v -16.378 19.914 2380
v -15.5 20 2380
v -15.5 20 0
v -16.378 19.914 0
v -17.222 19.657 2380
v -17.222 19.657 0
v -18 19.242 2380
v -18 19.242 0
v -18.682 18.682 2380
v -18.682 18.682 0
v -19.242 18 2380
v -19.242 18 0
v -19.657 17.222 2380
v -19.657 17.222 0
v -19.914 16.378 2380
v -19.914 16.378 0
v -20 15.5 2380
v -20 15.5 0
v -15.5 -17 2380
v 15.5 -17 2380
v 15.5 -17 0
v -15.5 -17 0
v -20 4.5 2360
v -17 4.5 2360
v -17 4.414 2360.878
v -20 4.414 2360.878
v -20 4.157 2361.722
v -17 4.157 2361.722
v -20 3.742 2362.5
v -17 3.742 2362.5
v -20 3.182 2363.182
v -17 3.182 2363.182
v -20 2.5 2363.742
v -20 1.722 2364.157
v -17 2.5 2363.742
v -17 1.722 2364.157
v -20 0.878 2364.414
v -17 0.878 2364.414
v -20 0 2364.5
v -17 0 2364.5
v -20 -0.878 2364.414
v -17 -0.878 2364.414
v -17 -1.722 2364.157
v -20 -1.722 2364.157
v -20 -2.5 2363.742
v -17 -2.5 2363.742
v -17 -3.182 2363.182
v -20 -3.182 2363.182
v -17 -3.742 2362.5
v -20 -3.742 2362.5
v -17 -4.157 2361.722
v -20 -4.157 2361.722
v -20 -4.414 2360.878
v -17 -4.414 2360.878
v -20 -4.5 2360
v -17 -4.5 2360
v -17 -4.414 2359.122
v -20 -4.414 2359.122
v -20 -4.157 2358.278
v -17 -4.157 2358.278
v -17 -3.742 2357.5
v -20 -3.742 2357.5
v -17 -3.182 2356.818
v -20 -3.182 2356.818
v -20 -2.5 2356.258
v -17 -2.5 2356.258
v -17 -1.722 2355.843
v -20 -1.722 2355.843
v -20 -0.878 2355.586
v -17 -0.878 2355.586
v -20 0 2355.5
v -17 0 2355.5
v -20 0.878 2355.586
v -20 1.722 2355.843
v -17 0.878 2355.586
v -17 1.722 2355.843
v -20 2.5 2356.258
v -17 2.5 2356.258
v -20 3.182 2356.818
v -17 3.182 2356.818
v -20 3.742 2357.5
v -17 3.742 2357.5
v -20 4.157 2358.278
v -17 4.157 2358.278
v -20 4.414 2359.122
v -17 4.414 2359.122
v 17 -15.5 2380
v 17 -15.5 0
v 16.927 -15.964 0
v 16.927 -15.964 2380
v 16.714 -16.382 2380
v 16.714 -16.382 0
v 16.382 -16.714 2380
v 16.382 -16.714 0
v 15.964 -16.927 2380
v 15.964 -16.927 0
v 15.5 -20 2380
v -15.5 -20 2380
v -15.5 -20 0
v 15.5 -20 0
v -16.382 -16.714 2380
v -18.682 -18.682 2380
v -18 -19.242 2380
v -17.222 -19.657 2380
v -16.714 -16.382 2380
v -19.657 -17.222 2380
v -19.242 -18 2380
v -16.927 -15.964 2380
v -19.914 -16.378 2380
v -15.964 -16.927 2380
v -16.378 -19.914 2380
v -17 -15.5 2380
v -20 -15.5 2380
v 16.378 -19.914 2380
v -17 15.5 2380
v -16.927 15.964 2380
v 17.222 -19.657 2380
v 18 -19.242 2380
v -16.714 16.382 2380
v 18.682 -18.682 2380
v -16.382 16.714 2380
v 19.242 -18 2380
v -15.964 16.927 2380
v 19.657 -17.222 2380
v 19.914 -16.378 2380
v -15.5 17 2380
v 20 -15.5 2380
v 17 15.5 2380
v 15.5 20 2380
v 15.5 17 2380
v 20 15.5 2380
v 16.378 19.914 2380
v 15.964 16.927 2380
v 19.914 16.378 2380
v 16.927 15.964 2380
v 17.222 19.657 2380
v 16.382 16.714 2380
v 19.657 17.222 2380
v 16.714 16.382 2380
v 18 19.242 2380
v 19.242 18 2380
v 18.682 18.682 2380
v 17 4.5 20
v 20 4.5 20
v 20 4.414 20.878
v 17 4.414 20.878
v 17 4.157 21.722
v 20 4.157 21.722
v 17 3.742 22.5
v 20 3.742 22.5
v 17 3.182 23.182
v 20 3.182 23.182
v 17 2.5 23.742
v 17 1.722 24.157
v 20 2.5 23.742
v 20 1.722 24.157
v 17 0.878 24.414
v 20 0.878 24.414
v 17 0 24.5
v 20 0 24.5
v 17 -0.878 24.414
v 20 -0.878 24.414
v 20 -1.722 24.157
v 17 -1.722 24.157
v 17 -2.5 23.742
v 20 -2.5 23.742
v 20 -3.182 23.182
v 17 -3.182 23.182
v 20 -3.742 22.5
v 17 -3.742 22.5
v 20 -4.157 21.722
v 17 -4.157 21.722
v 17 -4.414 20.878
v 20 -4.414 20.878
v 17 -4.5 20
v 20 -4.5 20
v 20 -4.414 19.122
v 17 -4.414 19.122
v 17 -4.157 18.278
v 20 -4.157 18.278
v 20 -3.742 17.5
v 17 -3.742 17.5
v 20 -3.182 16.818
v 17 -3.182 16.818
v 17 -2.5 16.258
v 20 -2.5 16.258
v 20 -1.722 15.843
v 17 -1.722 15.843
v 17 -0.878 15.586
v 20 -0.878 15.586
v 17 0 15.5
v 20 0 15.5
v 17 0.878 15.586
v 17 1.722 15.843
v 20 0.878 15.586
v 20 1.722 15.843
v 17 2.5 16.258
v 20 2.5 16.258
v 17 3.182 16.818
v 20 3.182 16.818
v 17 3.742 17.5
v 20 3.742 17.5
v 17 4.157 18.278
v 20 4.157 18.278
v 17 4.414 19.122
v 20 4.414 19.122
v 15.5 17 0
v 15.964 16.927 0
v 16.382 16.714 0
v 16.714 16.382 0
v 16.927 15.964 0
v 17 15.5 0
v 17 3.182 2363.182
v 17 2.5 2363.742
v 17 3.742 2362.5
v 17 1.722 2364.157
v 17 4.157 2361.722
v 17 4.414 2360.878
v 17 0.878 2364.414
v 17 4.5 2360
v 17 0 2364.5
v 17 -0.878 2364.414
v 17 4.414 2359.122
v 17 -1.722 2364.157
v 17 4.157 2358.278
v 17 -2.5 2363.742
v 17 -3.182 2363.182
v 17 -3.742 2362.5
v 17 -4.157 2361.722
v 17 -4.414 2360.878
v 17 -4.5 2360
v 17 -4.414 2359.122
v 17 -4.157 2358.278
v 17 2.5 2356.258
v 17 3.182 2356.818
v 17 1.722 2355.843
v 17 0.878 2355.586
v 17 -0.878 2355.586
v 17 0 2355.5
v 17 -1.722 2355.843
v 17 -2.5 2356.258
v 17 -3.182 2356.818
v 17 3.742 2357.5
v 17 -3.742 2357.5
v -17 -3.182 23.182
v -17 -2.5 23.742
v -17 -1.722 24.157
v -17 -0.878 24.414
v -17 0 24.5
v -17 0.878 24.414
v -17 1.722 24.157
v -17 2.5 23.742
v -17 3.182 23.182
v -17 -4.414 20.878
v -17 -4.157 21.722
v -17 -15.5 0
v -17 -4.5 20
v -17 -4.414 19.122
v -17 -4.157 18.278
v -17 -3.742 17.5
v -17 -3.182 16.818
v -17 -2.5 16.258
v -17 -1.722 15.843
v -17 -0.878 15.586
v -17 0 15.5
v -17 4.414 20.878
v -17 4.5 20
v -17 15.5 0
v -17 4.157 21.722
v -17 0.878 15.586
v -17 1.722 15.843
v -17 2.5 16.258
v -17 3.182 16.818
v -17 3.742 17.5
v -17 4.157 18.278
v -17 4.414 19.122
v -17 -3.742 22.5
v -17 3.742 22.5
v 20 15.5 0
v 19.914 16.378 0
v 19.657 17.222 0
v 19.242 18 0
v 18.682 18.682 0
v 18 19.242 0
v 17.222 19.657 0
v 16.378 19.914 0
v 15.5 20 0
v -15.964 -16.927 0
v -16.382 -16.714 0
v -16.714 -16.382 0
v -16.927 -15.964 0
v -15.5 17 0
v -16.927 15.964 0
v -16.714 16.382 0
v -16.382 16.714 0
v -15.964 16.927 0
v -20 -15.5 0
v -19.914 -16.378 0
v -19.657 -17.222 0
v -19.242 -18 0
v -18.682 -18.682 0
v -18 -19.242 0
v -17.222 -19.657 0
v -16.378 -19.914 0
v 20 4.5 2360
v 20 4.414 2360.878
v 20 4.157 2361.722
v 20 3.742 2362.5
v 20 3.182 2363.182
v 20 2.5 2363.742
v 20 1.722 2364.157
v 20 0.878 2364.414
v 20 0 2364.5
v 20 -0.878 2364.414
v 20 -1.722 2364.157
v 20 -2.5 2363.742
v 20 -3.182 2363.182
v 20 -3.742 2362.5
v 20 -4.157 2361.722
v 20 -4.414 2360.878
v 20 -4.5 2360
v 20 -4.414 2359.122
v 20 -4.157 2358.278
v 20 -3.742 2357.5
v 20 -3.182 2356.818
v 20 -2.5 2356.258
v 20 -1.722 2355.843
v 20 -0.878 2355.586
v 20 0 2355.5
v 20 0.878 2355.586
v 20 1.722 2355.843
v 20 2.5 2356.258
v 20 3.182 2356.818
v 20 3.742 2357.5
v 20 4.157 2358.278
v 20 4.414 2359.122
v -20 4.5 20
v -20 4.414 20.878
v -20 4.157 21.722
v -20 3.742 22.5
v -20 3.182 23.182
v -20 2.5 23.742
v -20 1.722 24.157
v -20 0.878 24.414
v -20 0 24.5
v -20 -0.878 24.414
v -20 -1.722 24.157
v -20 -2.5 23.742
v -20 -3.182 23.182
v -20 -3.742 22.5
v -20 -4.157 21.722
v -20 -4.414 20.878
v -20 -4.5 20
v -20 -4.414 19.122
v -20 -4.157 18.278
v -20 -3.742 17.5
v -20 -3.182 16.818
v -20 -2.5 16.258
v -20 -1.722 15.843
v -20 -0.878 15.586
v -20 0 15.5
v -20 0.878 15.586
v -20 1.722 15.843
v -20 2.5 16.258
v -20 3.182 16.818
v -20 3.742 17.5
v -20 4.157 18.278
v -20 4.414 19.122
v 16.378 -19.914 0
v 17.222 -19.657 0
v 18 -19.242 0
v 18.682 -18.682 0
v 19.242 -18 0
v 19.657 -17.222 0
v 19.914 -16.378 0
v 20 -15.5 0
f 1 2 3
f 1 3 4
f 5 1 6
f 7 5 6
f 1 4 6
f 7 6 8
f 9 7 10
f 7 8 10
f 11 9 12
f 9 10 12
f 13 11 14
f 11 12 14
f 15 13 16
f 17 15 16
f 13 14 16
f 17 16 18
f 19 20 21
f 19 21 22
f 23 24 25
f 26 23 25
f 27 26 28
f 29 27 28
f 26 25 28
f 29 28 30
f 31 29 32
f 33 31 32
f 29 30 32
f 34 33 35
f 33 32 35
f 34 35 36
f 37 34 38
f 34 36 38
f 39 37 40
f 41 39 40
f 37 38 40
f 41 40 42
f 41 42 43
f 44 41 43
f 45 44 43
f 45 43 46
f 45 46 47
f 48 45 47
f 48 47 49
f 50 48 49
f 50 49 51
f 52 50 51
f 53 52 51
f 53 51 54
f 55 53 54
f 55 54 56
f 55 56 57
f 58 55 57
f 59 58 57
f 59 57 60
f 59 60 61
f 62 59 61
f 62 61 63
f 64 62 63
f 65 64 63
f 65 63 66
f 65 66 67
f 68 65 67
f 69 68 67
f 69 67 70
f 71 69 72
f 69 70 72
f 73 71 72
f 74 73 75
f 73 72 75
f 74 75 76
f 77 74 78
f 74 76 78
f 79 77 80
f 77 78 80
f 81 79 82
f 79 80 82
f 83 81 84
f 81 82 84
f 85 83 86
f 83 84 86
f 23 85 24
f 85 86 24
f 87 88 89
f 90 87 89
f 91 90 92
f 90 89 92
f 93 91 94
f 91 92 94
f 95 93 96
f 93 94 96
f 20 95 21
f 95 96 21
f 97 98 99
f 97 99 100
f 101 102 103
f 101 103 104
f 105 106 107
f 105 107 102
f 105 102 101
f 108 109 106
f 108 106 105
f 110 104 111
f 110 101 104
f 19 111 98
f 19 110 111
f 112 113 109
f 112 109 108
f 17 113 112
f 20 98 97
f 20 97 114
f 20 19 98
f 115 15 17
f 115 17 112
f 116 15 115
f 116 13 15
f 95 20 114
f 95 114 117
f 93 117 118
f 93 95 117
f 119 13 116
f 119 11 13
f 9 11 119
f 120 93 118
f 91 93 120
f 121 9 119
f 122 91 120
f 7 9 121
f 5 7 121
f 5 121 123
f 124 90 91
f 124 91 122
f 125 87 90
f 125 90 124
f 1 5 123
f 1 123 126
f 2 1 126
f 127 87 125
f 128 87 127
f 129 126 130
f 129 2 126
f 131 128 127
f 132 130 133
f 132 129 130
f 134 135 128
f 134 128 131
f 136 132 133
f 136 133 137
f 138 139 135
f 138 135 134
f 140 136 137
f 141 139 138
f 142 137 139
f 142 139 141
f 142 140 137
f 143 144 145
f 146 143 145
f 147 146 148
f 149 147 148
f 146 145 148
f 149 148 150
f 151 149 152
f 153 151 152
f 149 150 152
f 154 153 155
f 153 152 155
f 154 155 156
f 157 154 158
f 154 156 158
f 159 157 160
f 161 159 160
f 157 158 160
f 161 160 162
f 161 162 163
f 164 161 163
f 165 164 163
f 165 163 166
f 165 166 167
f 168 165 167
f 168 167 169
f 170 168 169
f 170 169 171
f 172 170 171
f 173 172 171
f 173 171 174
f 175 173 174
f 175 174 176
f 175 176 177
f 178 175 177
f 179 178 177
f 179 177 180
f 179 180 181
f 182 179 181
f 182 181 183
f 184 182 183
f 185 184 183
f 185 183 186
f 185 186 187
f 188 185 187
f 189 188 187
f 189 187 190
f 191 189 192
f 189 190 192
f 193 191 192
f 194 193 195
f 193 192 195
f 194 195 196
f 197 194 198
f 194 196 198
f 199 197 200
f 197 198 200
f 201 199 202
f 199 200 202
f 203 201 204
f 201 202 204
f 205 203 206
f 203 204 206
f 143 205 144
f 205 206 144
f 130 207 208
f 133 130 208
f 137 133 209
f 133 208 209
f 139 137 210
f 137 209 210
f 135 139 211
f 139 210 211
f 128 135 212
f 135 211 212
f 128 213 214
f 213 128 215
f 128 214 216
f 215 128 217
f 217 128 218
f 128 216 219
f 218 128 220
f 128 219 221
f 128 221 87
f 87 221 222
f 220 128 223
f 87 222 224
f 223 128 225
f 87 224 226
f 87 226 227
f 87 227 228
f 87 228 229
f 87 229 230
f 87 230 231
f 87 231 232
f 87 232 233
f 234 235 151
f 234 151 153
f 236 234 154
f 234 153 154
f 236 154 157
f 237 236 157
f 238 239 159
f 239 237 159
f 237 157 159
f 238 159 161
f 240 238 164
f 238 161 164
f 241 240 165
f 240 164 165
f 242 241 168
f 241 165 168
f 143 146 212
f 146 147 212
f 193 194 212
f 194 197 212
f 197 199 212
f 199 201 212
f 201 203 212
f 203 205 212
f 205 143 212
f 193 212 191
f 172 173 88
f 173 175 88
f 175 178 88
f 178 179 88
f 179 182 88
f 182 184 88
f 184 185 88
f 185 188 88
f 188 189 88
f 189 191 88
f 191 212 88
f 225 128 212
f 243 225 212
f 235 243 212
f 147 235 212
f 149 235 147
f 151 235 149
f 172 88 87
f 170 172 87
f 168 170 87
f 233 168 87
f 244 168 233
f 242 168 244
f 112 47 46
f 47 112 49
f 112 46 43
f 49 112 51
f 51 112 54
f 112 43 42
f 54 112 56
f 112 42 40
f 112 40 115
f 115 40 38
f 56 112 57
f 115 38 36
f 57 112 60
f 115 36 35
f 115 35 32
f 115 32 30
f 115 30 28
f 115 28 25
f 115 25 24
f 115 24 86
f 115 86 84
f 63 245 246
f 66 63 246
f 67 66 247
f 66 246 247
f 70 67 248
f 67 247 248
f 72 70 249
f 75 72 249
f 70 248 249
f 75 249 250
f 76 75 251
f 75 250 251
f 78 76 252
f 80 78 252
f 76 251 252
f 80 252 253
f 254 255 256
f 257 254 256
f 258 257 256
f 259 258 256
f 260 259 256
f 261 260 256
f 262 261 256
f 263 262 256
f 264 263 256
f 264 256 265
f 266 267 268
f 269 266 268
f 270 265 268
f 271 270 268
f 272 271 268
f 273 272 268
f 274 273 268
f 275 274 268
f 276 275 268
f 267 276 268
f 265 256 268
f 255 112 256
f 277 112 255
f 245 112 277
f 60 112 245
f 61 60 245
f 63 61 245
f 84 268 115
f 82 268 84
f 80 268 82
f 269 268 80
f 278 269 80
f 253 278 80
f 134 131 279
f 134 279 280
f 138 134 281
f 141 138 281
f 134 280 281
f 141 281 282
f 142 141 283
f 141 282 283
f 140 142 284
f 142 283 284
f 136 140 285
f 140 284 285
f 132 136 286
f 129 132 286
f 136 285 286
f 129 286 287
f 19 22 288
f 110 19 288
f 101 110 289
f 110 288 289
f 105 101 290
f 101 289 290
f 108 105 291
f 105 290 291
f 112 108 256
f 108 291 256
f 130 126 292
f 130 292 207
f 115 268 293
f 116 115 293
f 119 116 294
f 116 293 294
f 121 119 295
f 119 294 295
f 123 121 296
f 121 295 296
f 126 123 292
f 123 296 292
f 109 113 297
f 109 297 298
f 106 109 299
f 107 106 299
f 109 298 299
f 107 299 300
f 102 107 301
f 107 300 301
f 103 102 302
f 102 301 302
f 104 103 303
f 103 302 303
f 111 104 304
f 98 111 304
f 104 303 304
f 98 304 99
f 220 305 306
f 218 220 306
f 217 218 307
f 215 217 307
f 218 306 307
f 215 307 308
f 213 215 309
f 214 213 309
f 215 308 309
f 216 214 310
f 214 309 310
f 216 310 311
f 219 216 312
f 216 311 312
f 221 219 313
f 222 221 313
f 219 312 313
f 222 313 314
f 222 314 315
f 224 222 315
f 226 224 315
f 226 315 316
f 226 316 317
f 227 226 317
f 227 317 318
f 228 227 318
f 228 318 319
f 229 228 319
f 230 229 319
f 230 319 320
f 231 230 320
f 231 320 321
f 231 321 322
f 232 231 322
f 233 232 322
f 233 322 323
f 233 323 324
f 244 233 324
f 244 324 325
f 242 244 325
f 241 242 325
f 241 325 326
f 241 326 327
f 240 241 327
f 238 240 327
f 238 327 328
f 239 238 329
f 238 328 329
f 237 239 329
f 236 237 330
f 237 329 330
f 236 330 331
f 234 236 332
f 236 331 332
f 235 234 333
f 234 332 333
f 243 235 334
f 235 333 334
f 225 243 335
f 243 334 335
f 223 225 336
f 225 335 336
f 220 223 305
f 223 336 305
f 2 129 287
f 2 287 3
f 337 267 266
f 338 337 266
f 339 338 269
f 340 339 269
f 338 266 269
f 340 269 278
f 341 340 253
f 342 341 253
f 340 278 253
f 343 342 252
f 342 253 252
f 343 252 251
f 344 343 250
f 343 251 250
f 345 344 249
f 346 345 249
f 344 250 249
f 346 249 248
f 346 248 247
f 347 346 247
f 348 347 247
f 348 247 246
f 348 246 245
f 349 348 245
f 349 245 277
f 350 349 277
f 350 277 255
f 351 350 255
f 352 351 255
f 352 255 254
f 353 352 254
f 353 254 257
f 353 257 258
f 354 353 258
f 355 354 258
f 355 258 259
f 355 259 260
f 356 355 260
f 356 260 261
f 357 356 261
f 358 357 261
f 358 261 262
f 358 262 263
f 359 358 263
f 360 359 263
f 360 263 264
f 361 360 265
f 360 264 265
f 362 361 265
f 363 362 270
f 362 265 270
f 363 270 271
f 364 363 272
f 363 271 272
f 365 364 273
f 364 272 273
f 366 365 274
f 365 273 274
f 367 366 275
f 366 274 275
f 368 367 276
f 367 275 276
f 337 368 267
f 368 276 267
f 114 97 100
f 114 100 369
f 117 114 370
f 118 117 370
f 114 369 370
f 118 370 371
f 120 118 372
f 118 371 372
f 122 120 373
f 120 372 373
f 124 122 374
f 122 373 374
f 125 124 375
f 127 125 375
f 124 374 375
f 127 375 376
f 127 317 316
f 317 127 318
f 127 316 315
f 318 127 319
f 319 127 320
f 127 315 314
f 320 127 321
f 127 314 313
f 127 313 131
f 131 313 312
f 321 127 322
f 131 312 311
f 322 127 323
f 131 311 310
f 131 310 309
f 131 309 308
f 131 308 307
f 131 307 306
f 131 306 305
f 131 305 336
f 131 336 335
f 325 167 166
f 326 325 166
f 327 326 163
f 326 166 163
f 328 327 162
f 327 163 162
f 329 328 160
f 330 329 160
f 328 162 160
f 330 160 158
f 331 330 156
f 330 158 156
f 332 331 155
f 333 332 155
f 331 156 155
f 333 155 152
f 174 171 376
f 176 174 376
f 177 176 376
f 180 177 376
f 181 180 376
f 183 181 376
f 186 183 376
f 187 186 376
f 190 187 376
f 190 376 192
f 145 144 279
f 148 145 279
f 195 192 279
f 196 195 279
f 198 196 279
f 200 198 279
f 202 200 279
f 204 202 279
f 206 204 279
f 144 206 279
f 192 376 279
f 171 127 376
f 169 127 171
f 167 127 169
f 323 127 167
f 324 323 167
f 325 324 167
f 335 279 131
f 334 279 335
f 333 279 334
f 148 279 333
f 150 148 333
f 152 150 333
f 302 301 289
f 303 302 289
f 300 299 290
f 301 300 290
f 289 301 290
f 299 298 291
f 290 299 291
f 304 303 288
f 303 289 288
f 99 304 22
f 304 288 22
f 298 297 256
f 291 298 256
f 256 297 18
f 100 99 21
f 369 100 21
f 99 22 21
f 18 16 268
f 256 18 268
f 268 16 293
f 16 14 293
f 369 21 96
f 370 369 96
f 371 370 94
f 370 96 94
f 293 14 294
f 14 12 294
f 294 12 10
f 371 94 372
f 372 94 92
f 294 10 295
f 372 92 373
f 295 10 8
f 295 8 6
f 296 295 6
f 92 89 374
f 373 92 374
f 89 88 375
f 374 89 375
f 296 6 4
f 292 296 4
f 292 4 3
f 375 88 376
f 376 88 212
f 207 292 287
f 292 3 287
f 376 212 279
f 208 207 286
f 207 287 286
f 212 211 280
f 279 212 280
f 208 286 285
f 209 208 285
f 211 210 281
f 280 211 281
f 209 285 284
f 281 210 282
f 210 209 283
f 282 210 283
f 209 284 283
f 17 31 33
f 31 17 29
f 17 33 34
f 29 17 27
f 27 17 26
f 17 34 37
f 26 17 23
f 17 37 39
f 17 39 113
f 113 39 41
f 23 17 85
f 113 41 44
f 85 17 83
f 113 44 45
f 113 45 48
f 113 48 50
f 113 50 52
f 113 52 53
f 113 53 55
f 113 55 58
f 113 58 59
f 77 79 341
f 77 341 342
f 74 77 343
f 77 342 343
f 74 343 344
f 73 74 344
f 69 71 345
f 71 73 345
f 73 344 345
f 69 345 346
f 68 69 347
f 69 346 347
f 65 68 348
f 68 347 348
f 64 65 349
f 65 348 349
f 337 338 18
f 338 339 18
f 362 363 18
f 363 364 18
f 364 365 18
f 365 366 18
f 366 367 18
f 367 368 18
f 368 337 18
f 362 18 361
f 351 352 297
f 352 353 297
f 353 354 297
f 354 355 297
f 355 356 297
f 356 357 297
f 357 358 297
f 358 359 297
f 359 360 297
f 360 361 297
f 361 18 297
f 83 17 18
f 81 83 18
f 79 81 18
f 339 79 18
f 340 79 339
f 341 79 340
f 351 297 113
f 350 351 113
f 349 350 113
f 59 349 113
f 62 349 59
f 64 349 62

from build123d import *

# Parameters (mm, degrees)
F1_DEPTH = 2380
F2_R     = 4.5
F3_DEPTH = 40.001


with BuildPart() as f1:
    # F0 (on Top) → F1 (new body)
    with BuildSketch(Plane.XY):
        with BuildLine():
            Line((-15.5, -20), (15.5, -20))
            ThreePointArc((15.5, -20), (18.681981, -18.681981), (20, -15.5))
            Line((20, -15.5), (20, 15.5))
            ThreePointArc((20, 15.5), (18.681981, 18.681981), (15.5, 20))
            Line((15.5, 20), (-15.5, 20))
            ThreePointArc((-15.5, 20), (-18.681981, 18.681981), (-20, 15.5))
            Line((-20, 15.5), (-20, -15.5))
            ThreePointArc((-20, -15.5), (-18.681981, -18.681981), (-15.5, -20))
        make_face()
        with BuildLine():
            ThreePointArc((15.5, 17), (16.56066, 16.56066), (17, 15.5))
            Line((17, 15.5), (17, -15.5))
            ThreePointArc((17, -15.5), (16.56066, -16.56066), (15.5, -17))
            Line((15.5, -17), (-15.5, -17))
            ThreePointArc((-15.5, -17), (-16.56066, -16.56066), (-17, -15.5))
            Line((-17, -15.5), (-17, 15.5))
            ThreePointArc((-17, 15.5), (-16.56066, 16.56066), (-15.5, 17))
            Line((-15.5, 17), (15.5, 17))
        make_face(mode=Mode.SUBTRACT)
    extrude(amount=F1_DEPTH)

    # F2 (on face) → F3 (cut, through all)
    with BuildSketch(Plane.YZ.offset(20)):
        with Locations((0, 2360)):
            Circle(F2_R)
        with Locations((0, 20)):
            Circle(F2_R)
    extrude(amount=-F3_DEPTH, mode=Mode.SUBTRACT)


solid = f1.part
